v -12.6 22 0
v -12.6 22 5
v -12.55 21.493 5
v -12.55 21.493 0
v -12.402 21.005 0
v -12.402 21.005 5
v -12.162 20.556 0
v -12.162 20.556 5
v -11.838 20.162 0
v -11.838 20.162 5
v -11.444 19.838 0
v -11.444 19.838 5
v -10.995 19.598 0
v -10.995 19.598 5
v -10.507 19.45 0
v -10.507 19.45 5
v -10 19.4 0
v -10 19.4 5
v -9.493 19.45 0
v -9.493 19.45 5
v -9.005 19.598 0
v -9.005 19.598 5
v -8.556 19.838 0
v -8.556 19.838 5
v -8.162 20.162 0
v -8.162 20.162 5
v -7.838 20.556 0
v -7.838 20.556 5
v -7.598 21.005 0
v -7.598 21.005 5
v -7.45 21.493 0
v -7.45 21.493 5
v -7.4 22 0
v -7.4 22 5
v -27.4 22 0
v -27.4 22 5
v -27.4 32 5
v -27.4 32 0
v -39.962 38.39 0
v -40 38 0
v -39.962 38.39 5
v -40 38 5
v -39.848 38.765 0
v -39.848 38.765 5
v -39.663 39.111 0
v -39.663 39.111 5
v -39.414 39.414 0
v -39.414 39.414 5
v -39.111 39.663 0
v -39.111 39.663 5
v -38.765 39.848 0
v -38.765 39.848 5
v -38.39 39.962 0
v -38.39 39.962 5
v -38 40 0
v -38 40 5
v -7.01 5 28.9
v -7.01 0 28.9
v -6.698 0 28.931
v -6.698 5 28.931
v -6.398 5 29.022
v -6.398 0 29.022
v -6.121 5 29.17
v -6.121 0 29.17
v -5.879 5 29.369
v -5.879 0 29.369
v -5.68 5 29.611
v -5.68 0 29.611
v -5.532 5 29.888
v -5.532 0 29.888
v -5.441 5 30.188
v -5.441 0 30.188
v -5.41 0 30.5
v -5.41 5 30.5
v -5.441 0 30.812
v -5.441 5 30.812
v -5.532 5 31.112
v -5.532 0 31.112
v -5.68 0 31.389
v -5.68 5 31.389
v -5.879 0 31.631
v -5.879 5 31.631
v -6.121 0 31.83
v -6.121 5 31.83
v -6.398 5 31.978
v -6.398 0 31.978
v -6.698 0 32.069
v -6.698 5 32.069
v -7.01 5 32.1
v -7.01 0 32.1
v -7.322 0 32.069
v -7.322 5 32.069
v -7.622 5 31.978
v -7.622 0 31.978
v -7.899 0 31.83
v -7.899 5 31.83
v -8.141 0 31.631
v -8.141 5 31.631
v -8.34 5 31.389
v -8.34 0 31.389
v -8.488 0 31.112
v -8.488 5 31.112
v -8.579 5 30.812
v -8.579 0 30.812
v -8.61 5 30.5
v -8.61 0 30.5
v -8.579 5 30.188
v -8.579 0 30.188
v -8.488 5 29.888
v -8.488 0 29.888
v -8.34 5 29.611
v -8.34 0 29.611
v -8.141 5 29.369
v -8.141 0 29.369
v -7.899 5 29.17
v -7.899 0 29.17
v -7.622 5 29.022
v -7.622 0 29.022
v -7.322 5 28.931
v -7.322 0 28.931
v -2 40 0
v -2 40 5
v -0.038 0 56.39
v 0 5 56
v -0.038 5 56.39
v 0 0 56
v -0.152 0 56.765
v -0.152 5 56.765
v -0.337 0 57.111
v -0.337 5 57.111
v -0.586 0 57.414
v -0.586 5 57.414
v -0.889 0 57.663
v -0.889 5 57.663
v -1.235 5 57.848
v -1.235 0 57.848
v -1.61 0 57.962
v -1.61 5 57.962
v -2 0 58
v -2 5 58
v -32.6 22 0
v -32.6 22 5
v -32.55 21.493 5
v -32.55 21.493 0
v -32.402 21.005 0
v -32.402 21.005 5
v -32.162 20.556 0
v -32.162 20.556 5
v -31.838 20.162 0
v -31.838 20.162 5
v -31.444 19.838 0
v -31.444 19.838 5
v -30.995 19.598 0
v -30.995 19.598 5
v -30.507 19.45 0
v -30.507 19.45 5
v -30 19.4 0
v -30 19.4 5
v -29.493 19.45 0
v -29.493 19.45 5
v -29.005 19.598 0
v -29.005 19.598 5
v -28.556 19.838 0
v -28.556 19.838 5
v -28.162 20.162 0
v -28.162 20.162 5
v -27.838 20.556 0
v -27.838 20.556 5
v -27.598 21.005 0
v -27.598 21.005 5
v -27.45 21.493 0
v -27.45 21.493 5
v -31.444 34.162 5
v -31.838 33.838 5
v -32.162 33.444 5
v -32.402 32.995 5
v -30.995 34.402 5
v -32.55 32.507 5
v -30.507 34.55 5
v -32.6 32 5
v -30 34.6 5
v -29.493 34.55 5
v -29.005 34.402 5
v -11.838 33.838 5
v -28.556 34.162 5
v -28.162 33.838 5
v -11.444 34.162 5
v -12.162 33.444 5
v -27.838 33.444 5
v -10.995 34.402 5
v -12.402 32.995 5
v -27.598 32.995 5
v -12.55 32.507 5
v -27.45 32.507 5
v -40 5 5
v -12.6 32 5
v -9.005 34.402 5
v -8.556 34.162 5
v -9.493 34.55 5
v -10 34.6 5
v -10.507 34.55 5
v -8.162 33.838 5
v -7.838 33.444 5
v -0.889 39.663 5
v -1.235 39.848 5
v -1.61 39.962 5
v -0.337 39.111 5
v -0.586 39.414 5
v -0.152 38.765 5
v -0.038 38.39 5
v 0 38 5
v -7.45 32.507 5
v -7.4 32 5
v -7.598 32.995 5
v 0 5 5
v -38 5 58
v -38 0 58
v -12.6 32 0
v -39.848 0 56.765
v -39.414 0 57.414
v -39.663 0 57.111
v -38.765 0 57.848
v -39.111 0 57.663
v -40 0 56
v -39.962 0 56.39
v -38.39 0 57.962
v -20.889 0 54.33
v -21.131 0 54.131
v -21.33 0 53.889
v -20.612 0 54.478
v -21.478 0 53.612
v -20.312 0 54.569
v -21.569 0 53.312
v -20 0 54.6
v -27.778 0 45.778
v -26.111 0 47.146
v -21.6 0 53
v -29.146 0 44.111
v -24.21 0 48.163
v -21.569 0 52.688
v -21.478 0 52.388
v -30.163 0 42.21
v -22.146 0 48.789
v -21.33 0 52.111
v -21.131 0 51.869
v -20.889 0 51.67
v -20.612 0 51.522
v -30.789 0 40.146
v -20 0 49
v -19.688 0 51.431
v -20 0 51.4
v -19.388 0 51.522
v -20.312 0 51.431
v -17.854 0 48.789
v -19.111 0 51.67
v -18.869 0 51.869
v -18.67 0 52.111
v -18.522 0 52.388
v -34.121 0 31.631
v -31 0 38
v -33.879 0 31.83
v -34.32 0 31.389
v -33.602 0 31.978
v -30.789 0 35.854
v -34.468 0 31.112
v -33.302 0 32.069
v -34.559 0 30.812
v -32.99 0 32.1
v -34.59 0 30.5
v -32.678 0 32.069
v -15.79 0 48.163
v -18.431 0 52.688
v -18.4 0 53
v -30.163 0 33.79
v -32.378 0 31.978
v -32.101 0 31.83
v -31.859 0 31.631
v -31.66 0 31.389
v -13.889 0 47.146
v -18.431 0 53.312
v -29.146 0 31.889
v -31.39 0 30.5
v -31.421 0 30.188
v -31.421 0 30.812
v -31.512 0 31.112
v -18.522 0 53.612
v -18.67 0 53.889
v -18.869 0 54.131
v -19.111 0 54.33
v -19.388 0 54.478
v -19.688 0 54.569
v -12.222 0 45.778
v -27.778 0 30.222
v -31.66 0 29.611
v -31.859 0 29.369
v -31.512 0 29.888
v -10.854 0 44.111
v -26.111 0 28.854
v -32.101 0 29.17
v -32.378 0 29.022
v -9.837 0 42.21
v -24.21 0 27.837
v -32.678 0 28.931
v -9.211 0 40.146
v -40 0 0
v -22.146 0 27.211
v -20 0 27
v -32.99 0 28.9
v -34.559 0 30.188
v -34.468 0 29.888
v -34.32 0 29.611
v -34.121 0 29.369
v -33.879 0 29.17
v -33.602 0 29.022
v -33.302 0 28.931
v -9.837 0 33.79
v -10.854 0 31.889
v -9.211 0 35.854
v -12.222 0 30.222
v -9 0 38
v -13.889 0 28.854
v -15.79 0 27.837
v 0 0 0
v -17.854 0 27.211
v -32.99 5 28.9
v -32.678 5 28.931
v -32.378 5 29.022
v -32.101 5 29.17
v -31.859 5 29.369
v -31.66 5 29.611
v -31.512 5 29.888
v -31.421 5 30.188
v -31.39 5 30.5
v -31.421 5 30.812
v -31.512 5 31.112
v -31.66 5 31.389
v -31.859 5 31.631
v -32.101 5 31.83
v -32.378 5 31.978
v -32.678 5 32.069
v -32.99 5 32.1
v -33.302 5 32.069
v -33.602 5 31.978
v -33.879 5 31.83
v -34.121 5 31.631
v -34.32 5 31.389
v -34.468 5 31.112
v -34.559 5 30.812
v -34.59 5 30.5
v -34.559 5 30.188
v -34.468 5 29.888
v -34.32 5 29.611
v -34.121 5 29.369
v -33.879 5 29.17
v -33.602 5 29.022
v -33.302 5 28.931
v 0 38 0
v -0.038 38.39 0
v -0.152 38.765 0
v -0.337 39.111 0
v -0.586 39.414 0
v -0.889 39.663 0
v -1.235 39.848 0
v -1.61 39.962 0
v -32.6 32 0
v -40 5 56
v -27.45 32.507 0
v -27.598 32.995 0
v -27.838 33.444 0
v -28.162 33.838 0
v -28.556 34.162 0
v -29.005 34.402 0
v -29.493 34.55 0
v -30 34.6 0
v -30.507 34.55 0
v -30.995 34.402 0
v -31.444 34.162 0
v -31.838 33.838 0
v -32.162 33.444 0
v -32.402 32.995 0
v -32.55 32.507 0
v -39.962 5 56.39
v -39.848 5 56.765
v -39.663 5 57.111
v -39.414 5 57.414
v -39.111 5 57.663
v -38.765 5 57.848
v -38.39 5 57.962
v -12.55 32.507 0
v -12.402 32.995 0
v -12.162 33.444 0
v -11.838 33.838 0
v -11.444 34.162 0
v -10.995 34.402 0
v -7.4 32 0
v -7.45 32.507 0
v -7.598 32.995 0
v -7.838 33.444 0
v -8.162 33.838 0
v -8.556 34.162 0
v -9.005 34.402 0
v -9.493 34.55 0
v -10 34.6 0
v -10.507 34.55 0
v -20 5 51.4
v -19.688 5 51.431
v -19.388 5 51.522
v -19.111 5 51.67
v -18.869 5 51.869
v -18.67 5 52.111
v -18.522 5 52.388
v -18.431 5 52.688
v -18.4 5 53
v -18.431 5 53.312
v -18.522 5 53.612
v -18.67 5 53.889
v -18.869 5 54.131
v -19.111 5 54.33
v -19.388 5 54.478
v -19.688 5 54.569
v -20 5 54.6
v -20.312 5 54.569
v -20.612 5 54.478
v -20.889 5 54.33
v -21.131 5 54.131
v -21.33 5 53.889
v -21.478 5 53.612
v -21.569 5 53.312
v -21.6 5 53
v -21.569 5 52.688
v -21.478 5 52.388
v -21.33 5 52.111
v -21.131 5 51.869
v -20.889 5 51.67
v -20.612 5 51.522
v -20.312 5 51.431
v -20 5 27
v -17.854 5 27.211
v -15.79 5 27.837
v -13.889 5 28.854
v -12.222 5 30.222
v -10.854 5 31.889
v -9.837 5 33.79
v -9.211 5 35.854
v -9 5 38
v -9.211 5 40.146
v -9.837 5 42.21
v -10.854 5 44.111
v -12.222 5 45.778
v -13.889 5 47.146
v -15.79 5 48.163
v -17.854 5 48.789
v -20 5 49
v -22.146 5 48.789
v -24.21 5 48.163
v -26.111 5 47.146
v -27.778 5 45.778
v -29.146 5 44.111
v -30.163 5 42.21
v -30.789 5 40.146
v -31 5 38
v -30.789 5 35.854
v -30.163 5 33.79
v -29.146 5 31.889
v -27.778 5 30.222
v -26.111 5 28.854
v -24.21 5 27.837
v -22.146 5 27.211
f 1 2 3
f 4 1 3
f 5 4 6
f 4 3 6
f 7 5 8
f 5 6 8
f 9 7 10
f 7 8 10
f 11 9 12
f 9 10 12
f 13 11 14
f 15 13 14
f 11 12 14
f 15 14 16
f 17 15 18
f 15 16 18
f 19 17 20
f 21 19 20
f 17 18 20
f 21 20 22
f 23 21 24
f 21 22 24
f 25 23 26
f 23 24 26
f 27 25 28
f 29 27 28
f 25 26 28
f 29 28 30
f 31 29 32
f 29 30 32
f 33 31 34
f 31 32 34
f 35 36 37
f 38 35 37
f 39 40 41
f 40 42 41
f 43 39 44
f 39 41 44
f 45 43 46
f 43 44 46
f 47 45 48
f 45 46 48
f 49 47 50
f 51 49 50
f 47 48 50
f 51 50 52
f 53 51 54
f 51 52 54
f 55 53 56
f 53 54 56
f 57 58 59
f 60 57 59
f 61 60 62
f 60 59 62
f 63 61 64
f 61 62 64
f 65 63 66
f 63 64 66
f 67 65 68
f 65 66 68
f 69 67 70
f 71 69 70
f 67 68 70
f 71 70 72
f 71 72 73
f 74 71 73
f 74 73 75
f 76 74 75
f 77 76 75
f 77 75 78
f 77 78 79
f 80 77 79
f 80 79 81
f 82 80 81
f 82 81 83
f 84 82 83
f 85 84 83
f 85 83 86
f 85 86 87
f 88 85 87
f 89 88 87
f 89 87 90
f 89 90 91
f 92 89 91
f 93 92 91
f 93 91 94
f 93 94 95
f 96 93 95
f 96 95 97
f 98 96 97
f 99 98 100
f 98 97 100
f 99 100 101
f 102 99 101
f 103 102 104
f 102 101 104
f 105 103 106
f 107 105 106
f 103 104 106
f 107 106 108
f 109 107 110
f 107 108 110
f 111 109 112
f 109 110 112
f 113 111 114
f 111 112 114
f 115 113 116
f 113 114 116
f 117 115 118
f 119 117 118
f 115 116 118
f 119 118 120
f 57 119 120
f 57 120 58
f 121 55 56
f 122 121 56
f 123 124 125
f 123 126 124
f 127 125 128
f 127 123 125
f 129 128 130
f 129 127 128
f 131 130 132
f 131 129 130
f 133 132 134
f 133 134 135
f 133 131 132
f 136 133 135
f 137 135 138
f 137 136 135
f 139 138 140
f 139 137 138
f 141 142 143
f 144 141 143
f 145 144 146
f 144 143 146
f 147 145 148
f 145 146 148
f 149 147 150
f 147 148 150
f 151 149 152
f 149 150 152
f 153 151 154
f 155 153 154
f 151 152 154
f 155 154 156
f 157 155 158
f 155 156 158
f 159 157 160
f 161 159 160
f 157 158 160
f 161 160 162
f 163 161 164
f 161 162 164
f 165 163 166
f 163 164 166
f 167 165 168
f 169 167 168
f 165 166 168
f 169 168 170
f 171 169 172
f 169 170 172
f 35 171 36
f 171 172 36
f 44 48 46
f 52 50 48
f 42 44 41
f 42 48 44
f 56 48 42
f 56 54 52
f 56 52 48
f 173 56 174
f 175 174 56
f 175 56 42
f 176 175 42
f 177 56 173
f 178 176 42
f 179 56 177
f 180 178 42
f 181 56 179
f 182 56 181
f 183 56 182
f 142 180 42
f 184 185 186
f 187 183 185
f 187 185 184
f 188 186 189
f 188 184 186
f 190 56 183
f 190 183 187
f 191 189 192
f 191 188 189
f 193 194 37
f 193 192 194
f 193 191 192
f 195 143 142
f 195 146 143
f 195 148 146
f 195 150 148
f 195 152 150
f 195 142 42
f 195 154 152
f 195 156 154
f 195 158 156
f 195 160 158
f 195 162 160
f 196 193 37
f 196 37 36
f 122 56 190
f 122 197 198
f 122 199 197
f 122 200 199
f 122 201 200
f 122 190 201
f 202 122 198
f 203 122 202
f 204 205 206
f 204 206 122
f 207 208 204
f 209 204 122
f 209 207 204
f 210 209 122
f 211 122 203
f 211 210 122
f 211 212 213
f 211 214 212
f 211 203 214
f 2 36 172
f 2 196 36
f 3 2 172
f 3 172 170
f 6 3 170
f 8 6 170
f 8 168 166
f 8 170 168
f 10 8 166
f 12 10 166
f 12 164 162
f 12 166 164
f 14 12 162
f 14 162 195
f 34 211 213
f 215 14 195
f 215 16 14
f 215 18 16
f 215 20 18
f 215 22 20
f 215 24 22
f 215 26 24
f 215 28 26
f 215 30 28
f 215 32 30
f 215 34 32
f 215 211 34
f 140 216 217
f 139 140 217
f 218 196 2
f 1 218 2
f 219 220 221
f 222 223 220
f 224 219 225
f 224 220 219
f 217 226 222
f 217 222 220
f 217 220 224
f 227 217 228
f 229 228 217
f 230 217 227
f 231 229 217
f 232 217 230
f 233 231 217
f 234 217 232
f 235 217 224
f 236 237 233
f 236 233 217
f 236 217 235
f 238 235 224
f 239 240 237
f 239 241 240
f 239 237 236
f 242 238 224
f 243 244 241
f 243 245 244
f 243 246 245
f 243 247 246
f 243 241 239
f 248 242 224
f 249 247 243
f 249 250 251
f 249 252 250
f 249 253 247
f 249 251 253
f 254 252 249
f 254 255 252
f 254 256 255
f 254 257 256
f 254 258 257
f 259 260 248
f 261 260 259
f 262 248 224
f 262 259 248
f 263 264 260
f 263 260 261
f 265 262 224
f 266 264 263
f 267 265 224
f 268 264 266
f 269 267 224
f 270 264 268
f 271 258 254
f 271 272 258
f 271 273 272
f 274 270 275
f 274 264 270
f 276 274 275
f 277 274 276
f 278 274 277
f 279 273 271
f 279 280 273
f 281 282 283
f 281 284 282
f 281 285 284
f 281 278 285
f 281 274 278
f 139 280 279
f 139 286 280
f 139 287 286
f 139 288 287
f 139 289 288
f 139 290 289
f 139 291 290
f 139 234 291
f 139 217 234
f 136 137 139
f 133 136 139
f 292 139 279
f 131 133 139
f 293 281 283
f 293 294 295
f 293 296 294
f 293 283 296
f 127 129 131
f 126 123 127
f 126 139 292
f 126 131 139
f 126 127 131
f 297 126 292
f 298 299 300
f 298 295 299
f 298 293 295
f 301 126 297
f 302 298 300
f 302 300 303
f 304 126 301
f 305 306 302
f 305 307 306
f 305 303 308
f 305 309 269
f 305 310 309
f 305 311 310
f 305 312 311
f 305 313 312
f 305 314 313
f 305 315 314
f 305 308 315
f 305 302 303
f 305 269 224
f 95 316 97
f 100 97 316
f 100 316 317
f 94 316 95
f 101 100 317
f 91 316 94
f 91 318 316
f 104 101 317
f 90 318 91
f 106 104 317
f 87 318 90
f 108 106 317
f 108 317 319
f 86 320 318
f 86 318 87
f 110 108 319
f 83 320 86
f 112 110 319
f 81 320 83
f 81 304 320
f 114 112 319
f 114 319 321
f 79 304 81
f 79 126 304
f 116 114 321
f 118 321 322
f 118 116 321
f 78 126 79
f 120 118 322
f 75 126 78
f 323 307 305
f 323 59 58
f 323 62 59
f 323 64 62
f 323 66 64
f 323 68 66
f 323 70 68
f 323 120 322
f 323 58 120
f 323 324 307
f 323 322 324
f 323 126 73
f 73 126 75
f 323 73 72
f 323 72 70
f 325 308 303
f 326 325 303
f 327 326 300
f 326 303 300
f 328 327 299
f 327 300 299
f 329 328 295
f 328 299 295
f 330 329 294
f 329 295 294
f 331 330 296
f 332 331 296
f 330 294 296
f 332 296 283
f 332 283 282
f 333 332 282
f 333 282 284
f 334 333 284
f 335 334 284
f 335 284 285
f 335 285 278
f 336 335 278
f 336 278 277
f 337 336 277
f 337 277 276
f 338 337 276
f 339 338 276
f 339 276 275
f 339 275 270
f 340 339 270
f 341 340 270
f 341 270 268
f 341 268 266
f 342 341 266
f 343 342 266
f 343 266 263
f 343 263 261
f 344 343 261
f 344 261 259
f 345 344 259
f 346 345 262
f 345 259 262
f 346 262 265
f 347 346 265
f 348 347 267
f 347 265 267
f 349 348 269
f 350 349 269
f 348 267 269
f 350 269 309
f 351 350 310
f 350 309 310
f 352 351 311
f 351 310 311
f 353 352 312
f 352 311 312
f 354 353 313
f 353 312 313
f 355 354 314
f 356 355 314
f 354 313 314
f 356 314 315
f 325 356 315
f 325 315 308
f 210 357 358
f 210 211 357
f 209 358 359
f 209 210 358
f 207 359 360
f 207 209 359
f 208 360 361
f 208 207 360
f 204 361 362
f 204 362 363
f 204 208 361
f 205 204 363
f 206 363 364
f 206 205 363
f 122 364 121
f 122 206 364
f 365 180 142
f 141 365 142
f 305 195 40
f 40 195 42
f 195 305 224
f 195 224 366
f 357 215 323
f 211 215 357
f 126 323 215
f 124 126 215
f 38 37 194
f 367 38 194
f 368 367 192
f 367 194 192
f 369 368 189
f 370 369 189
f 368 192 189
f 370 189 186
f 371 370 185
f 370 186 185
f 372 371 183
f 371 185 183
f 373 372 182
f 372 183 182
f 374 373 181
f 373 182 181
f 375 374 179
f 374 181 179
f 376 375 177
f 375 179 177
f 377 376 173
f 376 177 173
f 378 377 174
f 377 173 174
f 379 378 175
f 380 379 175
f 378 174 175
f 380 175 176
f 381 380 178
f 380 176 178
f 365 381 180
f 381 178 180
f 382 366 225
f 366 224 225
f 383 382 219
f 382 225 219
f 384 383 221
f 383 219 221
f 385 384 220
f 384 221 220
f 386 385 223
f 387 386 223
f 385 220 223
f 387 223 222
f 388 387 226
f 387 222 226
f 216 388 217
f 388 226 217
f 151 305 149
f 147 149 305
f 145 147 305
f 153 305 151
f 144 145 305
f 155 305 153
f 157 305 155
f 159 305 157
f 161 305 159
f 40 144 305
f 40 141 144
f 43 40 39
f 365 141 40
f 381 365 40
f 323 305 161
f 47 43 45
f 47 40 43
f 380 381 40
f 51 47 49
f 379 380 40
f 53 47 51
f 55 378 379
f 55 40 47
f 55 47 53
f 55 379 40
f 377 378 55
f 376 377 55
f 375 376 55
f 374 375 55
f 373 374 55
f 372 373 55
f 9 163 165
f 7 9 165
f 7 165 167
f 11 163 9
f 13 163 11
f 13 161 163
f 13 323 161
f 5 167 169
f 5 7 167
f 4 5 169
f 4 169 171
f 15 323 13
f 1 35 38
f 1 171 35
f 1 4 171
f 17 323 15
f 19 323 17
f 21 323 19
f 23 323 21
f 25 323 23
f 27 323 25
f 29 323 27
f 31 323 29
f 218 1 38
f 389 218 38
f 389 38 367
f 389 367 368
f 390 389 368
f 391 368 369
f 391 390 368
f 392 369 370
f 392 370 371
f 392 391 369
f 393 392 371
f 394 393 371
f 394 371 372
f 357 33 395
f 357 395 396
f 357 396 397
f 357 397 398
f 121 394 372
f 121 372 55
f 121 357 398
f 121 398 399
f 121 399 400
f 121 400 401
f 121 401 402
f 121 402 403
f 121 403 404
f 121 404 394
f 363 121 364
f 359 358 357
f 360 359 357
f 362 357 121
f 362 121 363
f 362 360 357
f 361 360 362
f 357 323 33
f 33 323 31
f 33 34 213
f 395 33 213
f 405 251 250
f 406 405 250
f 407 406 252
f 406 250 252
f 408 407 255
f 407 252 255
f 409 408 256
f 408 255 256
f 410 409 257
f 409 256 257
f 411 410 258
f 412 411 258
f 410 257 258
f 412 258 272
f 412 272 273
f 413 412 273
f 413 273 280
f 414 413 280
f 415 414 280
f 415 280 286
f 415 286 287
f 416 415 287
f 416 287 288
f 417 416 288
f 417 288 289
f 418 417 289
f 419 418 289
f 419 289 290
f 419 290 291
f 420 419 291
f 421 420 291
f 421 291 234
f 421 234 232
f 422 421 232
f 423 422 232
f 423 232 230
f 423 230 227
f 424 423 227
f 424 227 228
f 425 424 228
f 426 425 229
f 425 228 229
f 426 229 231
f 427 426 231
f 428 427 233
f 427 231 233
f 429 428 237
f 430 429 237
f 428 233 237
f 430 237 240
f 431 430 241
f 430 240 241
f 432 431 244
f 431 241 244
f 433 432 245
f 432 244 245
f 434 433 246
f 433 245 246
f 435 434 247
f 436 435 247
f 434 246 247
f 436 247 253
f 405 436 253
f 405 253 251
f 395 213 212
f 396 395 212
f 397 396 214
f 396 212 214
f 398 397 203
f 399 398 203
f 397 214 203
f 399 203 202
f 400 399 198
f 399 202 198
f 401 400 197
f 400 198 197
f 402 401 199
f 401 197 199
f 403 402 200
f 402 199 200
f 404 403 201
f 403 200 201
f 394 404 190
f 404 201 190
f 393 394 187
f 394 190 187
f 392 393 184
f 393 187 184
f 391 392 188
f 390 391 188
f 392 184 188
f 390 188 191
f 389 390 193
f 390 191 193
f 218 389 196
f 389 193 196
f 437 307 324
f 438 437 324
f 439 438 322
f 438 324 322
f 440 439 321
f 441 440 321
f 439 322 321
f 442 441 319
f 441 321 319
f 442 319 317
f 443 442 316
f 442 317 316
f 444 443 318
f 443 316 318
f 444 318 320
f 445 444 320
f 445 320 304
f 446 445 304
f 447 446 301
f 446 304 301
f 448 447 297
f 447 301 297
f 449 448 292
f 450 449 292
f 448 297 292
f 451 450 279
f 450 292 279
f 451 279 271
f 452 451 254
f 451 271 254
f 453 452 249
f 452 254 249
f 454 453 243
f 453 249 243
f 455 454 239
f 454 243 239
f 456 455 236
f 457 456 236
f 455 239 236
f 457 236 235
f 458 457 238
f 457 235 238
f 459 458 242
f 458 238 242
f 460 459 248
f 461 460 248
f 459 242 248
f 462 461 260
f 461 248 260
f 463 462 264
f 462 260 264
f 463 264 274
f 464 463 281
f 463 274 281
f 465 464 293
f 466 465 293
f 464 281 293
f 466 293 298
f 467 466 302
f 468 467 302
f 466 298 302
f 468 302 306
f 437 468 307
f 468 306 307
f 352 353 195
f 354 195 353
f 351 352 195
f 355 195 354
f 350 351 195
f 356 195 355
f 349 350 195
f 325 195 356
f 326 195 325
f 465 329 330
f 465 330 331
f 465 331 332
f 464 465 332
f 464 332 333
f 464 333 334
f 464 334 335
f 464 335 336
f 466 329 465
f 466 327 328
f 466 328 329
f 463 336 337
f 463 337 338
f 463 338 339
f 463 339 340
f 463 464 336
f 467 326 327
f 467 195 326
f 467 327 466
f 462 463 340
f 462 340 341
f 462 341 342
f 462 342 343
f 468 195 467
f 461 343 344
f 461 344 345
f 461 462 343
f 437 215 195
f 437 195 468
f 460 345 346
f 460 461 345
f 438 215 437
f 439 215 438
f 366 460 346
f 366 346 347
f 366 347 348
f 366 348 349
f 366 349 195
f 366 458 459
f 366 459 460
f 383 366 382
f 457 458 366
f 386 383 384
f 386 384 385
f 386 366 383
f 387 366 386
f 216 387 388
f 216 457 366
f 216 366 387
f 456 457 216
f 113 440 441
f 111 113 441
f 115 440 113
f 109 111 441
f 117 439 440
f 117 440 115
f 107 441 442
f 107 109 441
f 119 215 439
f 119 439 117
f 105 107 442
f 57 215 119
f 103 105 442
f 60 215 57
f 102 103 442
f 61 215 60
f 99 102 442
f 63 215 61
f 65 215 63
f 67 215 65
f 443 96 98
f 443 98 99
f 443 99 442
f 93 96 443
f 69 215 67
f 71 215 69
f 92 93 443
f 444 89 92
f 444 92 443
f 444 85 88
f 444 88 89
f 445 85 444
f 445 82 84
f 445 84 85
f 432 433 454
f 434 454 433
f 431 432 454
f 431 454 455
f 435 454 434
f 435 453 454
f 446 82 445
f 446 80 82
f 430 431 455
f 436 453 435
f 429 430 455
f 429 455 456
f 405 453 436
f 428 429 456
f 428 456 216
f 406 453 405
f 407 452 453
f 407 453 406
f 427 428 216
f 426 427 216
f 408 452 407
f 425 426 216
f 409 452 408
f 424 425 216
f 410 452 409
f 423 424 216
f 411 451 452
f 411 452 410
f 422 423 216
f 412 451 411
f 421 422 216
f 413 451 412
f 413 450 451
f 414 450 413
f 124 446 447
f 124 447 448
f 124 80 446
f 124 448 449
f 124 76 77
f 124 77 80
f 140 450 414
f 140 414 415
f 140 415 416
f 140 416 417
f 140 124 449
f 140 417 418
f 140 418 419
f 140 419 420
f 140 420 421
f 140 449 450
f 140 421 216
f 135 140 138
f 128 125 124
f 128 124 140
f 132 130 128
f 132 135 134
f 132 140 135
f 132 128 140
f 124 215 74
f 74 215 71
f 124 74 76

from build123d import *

# Parameters (mm, degrees)
PAD_DEPTH       = 40
SKETCH001_R     = 11
POCKET_DEPTH    = 5
SKETCH002_R     = 1.6
POCKET001_DEPTH = 40.001
FILLET_R        = 2
POCKET002_DEPTH = 5
FILLET001_R     = 2


with BuildPart() as part:
    # Sketch → Pad (new body)
    with BuildSketch(Plane.YZ):
        Polygon((5, 5), (5, 58), (0, 58), (0, 0), (40, 0), (40, 5), align=None)
    extrude(amount=-PAD_DEPTH)

    # Sketch001 (on Face3 of Pad) → Pocket (cut)
    with BuildSketch(Plane(origin=(0, 0, 0), x_dir=(0, 0, -1), z_dir=(0, -1, 0))):
        with Locations((-38, -20)):
            Circle(SKETCH001_R)
    extrude(amount=-POCKET_DEPTH, mode=Mode.SUBTRACT)

    # Sketch002 (on Face8 of Pocket) → Pocket001 (cut, through all)
    with BuildSketch(Plane(origin=(0, 0, 0), x_dir=(0, 0, -1), z_dir=(0, -1, 0))):
        with Locations((-53, -20)):
            Circle(SKETCH002_R)
        with Locations((-30.5, -32.99)):
            Circle(SKETCH002_R)
        with Locations((-30.5, -7.01)):
            Circle(SKETCH002_R)
    extrude(amount=-POCKET001_DEPTH, mode=Mode.SUBTRACT)

    # Fillet
    fillet_edges = [part.edges().sort_by_distance(p)[0] for p in [
        (0, 2.5, 58),
        (-40, 2.5, 58),
    ]]
    fillet(fillet_edges, radius=FILLET_R)

    # Sketch003 (on Face4 of Fillet) → Pocket002 (cut)
    with BuildSketch(Plane(origin=(0, 0, 5), x_dir=(0, -1, 0), z_dir=(0, 0, 1))):
        with BuildLine():
            ThreePointArc((-32, -7.4), (-34.6, -10), (-32, -12.6))
            Line((-32, -12.6), (-22, -12.6))
            ThreePointArc((-22, -12.6), (-19.4, -10), (-22, -7.4))
            Line((-22, -7.4), (-32, -7.4))
        make_face()
        with BuildLine():
            ThreePointArc((-32, -27.4), (-34.6, -30), (-32, -32.6))
            Line((-32, -32.6), (-22, -32.6))
            ThreePointArc((-22, -32.6), (-19.4, -30), (-22, -27.4))
            Line((-22, -27.4), (-32, -27.4))
        make_face()
    extrude(amount=-POCKET002_DEPTH, mode=Mode.SUBTRACT)

    # Fillet001
    fillet001_edges = [part.edges().sort_by_distance(p)[0] for p in [
        (0, 40, 2.5),
        (-40, 40, 2.5),
    ]]
    fillet(fillet001_edges, radius=FILLET001_R)


solid = part.part
